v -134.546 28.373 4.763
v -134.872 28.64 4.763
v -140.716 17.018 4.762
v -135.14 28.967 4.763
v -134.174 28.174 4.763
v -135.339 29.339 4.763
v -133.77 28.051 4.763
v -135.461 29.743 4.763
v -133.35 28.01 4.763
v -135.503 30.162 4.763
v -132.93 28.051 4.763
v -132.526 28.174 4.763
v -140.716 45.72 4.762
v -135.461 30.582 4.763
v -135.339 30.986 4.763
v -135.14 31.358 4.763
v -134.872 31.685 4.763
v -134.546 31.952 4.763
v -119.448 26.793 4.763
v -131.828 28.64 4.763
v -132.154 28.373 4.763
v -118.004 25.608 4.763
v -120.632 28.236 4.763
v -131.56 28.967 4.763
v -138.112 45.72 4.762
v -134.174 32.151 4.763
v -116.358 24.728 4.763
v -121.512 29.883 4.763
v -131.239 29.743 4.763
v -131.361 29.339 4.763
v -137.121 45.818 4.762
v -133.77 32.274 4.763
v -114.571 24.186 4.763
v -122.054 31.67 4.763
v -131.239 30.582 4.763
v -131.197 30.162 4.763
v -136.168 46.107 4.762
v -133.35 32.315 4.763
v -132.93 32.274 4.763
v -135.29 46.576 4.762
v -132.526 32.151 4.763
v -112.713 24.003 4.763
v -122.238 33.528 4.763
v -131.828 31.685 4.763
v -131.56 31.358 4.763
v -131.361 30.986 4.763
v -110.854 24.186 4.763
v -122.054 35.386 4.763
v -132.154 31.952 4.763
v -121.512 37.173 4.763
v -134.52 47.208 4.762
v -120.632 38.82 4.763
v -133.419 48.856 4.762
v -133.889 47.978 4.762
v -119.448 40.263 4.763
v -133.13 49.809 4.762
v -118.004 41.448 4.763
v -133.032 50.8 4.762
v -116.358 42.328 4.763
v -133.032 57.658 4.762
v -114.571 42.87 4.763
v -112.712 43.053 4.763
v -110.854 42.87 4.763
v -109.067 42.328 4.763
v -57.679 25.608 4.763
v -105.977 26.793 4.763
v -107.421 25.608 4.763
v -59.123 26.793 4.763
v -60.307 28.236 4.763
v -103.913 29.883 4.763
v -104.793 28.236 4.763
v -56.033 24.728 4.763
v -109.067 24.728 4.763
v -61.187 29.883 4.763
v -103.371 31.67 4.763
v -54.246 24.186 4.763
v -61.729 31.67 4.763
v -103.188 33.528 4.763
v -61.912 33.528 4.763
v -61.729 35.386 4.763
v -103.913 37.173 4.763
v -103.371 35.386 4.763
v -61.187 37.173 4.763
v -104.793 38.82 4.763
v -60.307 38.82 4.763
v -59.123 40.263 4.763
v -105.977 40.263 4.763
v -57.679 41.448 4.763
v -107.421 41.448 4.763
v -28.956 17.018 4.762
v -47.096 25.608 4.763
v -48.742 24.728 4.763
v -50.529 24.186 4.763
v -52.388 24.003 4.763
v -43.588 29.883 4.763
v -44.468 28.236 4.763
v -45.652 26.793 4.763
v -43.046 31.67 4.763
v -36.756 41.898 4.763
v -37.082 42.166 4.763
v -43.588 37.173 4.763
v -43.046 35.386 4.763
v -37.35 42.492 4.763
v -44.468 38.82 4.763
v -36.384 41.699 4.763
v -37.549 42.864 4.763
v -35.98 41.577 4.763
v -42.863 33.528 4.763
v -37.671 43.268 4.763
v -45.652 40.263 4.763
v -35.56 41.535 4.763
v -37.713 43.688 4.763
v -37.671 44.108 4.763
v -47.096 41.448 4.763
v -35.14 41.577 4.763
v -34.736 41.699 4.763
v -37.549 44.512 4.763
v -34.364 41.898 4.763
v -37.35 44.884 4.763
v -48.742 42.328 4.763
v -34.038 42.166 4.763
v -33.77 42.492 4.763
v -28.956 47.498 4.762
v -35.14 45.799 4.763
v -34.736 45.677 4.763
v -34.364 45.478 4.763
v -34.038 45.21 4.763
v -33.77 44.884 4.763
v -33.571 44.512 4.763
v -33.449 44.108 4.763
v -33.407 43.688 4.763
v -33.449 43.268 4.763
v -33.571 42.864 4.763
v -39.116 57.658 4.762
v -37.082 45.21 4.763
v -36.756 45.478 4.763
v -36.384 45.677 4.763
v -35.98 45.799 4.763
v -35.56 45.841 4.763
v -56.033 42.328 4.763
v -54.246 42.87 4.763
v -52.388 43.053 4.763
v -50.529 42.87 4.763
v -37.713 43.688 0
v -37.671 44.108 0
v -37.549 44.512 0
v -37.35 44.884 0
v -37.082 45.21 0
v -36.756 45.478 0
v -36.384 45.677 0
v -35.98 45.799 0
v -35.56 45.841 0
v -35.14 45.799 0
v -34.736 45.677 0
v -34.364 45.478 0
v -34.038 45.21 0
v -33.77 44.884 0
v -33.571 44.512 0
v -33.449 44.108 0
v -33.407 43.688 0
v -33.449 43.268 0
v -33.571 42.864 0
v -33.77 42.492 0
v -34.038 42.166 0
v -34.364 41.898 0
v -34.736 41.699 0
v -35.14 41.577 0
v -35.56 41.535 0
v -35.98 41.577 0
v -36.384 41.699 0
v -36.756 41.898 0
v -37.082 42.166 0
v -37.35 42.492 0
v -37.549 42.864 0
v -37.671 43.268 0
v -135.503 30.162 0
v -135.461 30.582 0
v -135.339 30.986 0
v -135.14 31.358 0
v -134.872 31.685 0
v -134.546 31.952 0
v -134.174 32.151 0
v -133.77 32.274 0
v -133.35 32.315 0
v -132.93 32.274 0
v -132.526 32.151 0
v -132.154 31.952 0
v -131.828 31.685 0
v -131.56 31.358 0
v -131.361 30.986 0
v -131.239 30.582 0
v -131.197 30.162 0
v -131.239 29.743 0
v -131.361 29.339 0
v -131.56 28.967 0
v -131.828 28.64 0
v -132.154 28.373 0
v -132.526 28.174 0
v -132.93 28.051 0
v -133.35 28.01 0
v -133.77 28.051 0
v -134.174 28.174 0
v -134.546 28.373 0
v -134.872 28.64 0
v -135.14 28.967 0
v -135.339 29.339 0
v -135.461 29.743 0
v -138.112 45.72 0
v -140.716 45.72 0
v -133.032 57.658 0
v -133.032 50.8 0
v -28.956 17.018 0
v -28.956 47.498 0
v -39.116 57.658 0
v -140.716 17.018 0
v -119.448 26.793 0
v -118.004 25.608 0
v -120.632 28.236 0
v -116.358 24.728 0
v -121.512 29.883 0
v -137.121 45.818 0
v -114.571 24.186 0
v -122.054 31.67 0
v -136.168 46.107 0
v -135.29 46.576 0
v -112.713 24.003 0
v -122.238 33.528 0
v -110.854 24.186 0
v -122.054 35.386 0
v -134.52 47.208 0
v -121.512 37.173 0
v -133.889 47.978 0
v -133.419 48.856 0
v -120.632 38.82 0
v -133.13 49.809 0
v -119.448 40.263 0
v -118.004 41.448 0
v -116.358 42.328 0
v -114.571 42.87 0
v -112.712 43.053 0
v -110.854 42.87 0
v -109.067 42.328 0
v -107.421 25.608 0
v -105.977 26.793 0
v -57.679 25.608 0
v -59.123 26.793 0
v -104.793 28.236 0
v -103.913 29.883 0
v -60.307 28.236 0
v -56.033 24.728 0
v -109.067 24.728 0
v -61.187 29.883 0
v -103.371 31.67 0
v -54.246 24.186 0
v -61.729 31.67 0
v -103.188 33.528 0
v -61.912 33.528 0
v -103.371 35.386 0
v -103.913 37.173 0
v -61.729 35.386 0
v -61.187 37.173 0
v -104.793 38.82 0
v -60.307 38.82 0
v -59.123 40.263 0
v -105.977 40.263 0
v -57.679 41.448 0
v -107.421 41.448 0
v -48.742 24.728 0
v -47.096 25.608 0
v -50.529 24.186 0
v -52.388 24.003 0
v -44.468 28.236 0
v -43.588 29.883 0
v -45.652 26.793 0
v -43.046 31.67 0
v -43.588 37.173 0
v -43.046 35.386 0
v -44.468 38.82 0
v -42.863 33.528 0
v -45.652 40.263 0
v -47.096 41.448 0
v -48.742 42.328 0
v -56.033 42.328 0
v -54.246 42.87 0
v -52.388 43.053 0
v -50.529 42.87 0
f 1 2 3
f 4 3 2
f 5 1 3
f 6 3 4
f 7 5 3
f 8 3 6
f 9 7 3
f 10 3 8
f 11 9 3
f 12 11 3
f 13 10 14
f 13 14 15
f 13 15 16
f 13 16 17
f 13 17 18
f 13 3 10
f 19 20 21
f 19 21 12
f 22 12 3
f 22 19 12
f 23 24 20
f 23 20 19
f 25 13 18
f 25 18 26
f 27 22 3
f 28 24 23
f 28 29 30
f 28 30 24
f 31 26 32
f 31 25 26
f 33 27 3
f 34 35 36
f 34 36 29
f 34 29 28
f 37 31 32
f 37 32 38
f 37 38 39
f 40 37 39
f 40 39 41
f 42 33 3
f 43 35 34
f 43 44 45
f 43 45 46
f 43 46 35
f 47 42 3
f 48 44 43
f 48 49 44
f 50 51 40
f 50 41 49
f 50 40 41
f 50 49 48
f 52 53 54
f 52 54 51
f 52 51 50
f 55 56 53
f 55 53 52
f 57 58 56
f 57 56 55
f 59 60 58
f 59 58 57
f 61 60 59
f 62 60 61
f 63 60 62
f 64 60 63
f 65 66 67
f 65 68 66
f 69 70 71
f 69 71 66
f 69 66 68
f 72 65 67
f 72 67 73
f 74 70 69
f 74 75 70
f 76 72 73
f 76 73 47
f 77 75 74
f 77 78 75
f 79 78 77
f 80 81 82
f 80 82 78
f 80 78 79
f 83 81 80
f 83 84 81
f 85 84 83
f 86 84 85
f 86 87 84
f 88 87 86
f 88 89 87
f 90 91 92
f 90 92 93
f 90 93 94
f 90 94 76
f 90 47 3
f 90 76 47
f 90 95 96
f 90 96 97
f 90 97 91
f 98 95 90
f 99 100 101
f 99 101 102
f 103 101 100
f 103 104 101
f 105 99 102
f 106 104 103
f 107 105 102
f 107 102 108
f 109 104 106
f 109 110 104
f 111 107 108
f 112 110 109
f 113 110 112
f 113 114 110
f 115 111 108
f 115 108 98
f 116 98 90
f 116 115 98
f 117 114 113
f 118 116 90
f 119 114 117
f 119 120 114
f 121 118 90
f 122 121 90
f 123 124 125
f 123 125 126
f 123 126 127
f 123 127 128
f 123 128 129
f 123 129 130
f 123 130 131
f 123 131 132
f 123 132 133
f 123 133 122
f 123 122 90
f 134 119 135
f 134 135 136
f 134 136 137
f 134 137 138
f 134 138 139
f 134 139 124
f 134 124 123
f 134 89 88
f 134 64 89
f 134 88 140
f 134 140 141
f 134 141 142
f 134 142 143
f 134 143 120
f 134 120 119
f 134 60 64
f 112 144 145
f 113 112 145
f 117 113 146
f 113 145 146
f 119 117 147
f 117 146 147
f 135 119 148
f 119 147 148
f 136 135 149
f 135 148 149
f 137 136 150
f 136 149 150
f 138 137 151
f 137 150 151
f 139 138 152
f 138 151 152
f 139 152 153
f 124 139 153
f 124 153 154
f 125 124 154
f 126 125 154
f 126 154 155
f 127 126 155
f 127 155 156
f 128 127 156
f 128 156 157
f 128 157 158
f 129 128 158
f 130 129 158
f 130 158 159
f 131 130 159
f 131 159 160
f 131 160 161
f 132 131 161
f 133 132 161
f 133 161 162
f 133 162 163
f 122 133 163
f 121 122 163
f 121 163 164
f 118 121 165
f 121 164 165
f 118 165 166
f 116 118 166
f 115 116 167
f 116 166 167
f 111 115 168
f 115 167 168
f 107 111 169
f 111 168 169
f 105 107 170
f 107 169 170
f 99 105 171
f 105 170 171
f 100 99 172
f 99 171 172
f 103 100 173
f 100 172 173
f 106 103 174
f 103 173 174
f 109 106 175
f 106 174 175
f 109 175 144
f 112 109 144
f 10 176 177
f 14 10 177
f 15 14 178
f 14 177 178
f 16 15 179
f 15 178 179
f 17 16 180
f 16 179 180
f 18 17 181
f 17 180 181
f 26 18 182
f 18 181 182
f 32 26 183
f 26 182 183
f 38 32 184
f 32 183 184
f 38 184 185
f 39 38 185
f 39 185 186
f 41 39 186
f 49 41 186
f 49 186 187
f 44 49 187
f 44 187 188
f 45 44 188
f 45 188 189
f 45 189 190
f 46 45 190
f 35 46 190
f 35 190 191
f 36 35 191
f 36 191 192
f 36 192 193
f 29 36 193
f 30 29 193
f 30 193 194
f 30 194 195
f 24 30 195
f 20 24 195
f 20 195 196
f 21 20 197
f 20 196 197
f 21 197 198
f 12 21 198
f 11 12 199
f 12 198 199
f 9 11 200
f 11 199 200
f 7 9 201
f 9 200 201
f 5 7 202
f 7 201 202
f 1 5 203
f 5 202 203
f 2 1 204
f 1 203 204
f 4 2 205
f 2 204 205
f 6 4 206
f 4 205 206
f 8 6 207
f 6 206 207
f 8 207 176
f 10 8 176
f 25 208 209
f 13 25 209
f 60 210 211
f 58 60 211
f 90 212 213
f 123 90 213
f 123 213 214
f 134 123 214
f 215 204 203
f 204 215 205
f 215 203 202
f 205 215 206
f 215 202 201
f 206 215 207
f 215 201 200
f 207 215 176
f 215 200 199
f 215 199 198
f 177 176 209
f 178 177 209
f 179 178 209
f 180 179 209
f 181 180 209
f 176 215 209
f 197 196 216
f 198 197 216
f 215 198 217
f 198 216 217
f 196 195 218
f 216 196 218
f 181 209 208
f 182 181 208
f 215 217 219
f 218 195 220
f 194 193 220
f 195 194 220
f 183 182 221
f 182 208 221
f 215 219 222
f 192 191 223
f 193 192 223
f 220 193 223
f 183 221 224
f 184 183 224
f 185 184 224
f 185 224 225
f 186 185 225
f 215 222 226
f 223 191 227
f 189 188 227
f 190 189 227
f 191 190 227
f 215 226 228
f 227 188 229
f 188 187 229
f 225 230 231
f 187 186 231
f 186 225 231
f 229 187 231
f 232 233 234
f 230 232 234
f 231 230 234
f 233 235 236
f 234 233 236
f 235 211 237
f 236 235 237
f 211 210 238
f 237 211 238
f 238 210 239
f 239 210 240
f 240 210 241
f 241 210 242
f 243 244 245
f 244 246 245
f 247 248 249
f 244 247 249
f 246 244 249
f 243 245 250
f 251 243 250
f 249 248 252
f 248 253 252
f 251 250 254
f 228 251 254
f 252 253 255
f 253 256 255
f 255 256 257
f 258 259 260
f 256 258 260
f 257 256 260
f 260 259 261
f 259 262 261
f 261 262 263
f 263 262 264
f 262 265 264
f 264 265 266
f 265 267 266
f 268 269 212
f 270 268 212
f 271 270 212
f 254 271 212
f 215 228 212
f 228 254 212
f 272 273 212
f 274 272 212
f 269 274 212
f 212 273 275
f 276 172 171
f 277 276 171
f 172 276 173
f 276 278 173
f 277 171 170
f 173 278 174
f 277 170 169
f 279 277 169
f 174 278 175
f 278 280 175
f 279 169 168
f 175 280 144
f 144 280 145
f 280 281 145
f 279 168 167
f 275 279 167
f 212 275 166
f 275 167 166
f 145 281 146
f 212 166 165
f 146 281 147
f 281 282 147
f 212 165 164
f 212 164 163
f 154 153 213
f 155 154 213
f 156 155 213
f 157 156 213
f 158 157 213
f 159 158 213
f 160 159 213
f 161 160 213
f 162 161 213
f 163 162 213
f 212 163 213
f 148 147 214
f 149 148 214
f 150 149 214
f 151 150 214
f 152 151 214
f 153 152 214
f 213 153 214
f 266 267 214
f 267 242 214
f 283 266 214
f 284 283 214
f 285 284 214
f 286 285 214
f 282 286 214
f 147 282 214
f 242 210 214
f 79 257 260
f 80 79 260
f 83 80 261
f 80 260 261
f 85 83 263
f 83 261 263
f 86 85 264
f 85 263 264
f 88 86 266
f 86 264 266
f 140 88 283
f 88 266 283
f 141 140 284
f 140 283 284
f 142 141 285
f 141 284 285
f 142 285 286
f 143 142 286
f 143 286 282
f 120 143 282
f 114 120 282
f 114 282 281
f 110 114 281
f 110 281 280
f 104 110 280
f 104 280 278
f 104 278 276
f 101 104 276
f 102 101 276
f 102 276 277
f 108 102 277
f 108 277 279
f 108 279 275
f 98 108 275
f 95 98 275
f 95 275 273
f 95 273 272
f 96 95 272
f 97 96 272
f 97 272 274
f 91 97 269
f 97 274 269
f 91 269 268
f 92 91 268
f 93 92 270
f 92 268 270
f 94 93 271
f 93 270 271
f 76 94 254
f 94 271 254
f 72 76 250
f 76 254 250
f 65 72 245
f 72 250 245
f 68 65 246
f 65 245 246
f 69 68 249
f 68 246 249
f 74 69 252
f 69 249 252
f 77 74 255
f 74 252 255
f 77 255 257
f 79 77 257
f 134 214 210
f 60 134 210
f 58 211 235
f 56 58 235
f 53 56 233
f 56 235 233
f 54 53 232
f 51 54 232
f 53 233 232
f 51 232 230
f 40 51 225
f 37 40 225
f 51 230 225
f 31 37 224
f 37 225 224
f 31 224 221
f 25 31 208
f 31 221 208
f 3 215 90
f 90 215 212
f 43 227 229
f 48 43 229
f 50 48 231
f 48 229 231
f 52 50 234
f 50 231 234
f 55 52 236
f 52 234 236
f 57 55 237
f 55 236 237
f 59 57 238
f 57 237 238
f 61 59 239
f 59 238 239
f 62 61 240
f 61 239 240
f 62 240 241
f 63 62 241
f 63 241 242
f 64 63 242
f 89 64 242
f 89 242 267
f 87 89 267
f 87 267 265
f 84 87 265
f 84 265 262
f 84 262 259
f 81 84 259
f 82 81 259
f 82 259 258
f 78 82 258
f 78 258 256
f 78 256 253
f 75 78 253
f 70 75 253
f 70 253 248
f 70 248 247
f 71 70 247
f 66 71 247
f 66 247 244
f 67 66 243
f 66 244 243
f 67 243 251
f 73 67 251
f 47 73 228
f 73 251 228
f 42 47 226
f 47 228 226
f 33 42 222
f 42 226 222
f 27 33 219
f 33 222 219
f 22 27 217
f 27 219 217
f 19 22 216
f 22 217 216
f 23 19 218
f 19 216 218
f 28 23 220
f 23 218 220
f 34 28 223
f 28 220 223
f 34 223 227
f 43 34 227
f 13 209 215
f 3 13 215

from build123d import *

# Parameters (mm, degrees)
BOSS_EXTRUDE1_DEPTH         = 4.7625
F_6_CLEARANCE_HOLE1_D       = 4.3053
F_3_4_0_75_DIAMETER_HOLE1_D = 19.05


with BuildPart() as part:
    # Sketch1 → Boss-Extrude1 (new body)
    with BuildSketch(Plane.XY):
        with BuildLine():
            Line((-133.0325, 57.658), (-133.0325, 50.8))
            ThreePointArc((-133.0325, 50.8), (-134.520397552, 47.207897552), (-138.1125, 45.72))
            Line((-138.1125, 45.72), (-140.716, 45.72))
            Line((-140.716, 45.72), (-140.716, 17.018))
            Line((-140.716, 17.018), (-28.956, 17.018))
            Line((-28.956, 17.018), (-28.956, 47.498))
            Line((-28.956, 47.498), (-39.116, 57.658))
            Line((-39.116, 57.658), (-133.0325, 57.658))
        make_face()
    extrude(amount=BOSS_EXTRUDE1_DEPTH)

    # #6 Clearance Hole1 (through all)
    with Locations(Plane.XY.offset(4.7625)):
        with Locations((-133.35, 30.1625), (-35.56, 43.688)):
            Hole(F_6_CLEARANCE_HOLE1_D / 2)

    # 3/4 (0.75) Diameter Hole1 (through all)
    with Locations(Plane.XY.offset(4.7625)):
        with Locations((-112.7125, 33.528), (-52.3875, 33.528)):
            Hole(F_3_4_0_75_DIAMETER_HOLE1_D / 2)


solid = part.part
